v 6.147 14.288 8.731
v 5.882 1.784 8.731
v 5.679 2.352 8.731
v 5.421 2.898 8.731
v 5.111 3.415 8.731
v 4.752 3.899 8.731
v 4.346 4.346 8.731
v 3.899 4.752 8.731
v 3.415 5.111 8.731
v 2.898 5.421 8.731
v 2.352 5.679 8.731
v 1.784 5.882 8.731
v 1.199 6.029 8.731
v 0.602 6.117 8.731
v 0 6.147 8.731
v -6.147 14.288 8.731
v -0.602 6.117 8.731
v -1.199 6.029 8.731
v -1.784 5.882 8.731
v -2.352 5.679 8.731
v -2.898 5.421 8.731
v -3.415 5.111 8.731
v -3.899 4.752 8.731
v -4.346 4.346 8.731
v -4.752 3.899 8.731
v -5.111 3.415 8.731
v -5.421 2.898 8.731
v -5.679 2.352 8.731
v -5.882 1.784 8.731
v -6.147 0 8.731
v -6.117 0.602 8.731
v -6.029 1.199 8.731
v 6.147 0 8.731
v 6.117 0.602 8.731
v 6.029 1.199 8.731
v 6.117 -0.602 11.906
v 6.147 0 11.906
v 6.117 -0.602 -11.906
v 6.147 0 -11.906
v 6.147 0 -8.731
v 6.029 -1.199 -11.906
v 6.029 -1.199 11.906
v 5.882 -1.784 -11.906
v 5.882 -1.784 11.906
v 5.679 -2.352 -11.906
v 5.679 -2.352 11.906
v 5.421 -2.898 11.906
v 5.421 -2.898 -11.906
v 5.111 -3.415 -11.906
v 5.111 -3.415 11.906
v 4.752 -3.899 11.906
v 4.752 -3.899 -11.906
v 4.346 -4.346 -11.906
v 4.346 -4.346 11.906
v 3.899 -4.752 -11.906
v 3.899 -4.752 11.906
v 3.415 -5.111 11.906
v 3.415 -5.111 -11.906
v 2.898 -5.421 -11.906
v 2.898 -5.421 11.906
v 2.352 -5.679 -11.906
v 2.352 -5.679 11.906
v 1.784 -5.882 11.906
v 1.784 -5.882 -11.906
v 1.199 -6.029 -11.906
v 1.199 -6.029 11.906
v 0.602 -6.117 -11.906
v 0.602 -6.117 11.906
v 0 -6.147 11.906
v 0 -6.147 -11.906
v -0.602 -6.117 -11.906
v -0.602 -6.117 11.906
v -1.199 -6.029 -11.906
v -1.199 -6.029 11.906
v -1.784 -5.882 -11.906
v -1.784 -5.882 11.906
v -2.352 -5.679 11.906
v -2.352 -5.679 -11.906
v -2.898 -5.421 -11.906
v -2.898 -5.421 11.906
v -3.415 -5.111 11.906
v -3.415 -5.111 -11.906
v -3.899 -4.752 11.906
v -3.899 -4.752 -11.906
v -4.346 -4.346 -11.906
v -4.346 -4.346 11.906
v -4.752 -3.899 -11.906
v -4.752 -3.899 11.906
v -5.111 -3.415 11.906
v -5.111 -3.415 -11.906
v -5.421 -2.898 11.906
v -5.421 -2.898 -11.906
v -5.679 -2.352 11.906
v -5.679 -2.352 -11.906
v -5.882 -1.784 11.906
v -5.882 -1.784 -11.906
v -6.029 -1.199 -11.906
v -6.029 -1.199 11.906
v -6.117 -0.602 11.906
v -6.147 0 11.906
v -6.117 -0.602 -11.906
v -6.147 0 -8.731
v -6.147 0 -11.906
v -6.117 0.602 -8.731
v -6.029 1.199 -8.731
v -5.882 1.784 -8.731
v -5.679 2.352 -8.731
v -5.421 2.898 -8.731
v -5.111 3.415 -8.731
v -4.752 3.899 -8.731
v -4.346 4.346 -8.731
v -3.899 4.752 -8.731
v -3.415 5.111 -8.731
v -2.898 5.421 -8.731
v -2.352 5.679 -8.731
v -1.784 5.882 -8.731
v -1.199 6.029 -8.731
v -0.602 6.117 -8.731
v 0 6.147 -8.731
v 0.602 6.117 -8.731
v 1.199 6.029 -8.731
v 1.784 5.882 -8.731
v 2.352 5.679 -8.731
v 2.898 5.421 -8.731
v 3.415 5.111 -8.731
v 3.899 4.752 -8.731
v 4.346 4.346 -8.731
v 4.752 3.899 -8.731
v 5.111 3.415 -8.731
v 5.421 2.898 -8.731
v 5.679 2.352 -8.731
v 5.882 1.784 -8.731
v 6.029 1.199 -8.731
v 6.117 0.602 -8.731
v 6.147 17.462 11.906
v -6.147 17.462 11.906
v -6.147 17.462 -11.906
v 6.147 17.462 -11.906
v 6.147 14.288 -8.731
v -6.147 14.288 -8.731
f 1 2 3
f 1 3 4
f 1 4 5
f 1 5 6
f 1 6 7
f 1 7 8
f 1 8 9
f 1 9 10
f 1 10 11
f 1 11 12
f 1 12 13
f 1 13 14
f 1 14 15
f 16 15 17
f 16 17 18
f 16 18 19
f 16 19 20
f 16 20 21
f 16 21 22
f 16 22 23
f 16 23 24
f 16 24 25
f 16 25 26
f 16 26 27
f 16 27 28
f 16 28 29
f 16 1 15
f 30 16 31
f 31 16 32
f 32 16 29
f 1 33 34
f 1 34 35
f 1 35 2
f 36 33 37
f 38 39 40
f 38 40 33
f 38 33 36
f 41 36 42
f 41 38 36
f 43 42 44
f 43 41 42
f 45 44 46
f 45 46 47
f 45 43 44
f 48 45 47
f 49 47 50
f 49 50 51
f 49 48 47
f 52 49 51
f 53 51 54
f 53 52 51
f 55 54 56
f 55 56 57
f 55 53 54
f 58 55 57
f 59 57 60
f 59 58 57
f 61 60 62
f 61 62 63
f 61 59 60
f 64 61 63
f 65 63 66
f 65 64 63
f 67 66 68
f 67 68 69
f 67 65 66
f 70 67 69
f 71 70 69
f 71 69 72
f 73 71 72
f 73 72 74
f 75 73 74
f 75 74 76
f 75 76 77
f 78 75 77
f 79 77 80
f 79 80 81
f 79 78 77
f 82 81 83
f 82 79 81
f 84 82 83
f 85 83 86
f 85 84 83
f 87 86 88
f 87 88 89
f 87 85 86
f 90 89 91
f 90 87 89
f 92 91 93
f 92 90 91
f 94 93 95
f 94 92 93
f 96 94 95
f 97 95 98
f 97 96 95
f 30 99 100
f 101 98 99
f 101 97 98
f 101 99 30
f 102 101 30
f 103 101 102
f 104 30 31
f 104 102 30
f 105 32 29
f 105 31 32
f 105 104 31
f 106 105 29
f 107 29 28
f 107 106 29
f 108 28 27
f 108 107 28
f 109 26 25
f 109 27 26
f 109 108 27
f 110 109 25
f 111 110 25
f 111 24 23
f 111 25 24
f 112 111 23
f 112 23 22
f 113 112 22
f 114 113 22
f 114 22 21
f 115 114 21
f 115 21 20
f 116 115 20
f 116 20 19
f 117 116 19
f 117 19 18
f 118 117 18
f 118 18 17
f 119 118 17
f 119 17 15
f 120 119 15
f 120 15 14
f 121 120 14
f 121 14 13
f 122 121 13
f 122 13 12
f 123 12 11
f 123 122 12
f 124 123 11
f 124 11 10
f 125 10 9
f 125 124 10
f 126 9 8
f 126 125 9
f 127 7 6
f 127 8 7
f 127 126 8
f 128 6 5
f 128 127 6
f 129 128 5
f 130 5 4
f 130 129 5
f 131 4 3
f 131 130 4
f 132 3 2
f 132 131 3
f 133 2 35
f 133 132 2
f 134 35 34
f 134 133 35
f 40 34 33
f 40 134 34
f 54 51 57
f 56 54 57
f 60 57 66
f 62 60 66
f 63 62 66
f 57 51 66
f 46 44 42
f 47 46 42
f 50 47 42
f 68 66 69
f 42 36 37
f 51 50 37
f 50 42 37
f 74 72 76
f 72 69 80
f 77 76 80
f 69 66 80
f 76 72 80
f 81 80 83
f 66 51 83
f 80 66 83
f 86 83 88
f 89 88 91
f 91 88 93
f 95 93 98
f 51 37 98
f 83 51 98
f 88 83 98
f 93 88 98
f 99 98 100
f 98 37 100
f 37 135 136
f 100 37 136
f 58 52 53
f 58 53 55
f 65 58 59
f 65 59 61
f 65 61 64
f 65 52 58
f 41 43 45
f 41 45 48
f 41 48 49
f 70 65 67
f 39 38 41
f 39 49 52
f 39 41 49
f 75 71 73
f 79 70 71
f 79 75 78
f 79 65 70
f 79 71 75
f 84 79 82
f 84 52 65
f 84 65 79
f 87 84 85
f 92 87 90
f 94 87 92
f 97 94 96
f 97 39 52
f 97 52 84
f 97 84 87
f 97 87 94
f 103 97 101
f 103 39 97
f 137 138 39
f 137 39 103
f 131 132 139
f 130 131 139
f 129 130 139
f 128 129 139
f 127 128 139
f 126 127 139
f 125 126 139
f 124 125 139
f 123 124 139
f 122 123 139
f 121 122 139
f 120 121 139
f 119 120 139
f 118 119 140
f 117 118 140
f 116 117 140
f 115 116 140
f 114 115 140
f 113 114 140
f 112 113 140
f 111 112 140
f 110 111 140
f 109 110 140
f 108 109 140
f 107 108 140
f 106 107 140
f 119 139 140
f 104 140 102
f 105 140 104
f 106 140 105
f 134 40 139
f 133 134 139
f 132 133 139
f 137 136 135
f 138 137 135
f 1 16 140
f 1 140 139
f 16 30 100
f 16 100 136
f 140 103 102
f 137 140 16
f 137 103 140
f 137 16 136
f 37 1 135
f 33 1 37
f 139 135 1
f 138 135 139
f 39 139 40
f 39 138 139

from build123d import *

# Parameters (mm, degrees)
SKETCH1_R             = 6.1468
BOSS_EXTRUDE1_DEPTH   = 8.73125
SKETCH1_W             = 12.2936
SKETCH1_H             = 3.175
BOSS_EXTRUDE1_2_DEPTH = 8.73125
BOSS_EXTRUDE2_START   = 3.175
BOSS_EXTRUDE2_DEPTH   = 3.175


with BuildPart() as part:
    # Sketch1 → Boss-Extrude1 (new, symmetric)
    with BuildSketch(Plane.XY):
        Circle(SKETCH1_R)
    extrude(amount=BOSS_EXTRUDE1_DEPTH, both=True)



with BuildPart() as body_2:
    # Sketch1 → Boss-Extrude1 2 (new, symmetric)
    with BuildSketch(Plane.XY):
        with Locations((0, 15.875)):
            Rectangle(SKETCH1_W, SKETCH1_H)
    extrude(amount=BOSS_EXTRUDE1_2_DEPTH, both=True)


with BuildPart() as part_1:
    add(part.part)

    add(body_2.part)  # Boss-Extrude2 merges body 2
    # Sketch2 → Boss-Extrude2 (add)
    with BuildSketch(Plane.XY.offset(8.73125).offset(BOSS_EXTRUDE2_START)):
        with BuildLine():
            Line((-6.1468, 0), (-6.1468, 17.4625))
            Line((-6.1468, 17.4625), (6.1468, 17.4625))
            Line((6.1468, 17.4625), (6.1468, 0))
            ThreePointArc((6.1468, 0), (0, -6.1468), (-6.1468, 0))
        make_face()
    boss_extrude2 = extrude(amount=-BOSS_EXTRUDE2_DEPTH)

    # Mirror1: Boss-Extrude2 across plane
    add(boss_extrude2.mirror(Plane.XY))


solid = part_1.part
